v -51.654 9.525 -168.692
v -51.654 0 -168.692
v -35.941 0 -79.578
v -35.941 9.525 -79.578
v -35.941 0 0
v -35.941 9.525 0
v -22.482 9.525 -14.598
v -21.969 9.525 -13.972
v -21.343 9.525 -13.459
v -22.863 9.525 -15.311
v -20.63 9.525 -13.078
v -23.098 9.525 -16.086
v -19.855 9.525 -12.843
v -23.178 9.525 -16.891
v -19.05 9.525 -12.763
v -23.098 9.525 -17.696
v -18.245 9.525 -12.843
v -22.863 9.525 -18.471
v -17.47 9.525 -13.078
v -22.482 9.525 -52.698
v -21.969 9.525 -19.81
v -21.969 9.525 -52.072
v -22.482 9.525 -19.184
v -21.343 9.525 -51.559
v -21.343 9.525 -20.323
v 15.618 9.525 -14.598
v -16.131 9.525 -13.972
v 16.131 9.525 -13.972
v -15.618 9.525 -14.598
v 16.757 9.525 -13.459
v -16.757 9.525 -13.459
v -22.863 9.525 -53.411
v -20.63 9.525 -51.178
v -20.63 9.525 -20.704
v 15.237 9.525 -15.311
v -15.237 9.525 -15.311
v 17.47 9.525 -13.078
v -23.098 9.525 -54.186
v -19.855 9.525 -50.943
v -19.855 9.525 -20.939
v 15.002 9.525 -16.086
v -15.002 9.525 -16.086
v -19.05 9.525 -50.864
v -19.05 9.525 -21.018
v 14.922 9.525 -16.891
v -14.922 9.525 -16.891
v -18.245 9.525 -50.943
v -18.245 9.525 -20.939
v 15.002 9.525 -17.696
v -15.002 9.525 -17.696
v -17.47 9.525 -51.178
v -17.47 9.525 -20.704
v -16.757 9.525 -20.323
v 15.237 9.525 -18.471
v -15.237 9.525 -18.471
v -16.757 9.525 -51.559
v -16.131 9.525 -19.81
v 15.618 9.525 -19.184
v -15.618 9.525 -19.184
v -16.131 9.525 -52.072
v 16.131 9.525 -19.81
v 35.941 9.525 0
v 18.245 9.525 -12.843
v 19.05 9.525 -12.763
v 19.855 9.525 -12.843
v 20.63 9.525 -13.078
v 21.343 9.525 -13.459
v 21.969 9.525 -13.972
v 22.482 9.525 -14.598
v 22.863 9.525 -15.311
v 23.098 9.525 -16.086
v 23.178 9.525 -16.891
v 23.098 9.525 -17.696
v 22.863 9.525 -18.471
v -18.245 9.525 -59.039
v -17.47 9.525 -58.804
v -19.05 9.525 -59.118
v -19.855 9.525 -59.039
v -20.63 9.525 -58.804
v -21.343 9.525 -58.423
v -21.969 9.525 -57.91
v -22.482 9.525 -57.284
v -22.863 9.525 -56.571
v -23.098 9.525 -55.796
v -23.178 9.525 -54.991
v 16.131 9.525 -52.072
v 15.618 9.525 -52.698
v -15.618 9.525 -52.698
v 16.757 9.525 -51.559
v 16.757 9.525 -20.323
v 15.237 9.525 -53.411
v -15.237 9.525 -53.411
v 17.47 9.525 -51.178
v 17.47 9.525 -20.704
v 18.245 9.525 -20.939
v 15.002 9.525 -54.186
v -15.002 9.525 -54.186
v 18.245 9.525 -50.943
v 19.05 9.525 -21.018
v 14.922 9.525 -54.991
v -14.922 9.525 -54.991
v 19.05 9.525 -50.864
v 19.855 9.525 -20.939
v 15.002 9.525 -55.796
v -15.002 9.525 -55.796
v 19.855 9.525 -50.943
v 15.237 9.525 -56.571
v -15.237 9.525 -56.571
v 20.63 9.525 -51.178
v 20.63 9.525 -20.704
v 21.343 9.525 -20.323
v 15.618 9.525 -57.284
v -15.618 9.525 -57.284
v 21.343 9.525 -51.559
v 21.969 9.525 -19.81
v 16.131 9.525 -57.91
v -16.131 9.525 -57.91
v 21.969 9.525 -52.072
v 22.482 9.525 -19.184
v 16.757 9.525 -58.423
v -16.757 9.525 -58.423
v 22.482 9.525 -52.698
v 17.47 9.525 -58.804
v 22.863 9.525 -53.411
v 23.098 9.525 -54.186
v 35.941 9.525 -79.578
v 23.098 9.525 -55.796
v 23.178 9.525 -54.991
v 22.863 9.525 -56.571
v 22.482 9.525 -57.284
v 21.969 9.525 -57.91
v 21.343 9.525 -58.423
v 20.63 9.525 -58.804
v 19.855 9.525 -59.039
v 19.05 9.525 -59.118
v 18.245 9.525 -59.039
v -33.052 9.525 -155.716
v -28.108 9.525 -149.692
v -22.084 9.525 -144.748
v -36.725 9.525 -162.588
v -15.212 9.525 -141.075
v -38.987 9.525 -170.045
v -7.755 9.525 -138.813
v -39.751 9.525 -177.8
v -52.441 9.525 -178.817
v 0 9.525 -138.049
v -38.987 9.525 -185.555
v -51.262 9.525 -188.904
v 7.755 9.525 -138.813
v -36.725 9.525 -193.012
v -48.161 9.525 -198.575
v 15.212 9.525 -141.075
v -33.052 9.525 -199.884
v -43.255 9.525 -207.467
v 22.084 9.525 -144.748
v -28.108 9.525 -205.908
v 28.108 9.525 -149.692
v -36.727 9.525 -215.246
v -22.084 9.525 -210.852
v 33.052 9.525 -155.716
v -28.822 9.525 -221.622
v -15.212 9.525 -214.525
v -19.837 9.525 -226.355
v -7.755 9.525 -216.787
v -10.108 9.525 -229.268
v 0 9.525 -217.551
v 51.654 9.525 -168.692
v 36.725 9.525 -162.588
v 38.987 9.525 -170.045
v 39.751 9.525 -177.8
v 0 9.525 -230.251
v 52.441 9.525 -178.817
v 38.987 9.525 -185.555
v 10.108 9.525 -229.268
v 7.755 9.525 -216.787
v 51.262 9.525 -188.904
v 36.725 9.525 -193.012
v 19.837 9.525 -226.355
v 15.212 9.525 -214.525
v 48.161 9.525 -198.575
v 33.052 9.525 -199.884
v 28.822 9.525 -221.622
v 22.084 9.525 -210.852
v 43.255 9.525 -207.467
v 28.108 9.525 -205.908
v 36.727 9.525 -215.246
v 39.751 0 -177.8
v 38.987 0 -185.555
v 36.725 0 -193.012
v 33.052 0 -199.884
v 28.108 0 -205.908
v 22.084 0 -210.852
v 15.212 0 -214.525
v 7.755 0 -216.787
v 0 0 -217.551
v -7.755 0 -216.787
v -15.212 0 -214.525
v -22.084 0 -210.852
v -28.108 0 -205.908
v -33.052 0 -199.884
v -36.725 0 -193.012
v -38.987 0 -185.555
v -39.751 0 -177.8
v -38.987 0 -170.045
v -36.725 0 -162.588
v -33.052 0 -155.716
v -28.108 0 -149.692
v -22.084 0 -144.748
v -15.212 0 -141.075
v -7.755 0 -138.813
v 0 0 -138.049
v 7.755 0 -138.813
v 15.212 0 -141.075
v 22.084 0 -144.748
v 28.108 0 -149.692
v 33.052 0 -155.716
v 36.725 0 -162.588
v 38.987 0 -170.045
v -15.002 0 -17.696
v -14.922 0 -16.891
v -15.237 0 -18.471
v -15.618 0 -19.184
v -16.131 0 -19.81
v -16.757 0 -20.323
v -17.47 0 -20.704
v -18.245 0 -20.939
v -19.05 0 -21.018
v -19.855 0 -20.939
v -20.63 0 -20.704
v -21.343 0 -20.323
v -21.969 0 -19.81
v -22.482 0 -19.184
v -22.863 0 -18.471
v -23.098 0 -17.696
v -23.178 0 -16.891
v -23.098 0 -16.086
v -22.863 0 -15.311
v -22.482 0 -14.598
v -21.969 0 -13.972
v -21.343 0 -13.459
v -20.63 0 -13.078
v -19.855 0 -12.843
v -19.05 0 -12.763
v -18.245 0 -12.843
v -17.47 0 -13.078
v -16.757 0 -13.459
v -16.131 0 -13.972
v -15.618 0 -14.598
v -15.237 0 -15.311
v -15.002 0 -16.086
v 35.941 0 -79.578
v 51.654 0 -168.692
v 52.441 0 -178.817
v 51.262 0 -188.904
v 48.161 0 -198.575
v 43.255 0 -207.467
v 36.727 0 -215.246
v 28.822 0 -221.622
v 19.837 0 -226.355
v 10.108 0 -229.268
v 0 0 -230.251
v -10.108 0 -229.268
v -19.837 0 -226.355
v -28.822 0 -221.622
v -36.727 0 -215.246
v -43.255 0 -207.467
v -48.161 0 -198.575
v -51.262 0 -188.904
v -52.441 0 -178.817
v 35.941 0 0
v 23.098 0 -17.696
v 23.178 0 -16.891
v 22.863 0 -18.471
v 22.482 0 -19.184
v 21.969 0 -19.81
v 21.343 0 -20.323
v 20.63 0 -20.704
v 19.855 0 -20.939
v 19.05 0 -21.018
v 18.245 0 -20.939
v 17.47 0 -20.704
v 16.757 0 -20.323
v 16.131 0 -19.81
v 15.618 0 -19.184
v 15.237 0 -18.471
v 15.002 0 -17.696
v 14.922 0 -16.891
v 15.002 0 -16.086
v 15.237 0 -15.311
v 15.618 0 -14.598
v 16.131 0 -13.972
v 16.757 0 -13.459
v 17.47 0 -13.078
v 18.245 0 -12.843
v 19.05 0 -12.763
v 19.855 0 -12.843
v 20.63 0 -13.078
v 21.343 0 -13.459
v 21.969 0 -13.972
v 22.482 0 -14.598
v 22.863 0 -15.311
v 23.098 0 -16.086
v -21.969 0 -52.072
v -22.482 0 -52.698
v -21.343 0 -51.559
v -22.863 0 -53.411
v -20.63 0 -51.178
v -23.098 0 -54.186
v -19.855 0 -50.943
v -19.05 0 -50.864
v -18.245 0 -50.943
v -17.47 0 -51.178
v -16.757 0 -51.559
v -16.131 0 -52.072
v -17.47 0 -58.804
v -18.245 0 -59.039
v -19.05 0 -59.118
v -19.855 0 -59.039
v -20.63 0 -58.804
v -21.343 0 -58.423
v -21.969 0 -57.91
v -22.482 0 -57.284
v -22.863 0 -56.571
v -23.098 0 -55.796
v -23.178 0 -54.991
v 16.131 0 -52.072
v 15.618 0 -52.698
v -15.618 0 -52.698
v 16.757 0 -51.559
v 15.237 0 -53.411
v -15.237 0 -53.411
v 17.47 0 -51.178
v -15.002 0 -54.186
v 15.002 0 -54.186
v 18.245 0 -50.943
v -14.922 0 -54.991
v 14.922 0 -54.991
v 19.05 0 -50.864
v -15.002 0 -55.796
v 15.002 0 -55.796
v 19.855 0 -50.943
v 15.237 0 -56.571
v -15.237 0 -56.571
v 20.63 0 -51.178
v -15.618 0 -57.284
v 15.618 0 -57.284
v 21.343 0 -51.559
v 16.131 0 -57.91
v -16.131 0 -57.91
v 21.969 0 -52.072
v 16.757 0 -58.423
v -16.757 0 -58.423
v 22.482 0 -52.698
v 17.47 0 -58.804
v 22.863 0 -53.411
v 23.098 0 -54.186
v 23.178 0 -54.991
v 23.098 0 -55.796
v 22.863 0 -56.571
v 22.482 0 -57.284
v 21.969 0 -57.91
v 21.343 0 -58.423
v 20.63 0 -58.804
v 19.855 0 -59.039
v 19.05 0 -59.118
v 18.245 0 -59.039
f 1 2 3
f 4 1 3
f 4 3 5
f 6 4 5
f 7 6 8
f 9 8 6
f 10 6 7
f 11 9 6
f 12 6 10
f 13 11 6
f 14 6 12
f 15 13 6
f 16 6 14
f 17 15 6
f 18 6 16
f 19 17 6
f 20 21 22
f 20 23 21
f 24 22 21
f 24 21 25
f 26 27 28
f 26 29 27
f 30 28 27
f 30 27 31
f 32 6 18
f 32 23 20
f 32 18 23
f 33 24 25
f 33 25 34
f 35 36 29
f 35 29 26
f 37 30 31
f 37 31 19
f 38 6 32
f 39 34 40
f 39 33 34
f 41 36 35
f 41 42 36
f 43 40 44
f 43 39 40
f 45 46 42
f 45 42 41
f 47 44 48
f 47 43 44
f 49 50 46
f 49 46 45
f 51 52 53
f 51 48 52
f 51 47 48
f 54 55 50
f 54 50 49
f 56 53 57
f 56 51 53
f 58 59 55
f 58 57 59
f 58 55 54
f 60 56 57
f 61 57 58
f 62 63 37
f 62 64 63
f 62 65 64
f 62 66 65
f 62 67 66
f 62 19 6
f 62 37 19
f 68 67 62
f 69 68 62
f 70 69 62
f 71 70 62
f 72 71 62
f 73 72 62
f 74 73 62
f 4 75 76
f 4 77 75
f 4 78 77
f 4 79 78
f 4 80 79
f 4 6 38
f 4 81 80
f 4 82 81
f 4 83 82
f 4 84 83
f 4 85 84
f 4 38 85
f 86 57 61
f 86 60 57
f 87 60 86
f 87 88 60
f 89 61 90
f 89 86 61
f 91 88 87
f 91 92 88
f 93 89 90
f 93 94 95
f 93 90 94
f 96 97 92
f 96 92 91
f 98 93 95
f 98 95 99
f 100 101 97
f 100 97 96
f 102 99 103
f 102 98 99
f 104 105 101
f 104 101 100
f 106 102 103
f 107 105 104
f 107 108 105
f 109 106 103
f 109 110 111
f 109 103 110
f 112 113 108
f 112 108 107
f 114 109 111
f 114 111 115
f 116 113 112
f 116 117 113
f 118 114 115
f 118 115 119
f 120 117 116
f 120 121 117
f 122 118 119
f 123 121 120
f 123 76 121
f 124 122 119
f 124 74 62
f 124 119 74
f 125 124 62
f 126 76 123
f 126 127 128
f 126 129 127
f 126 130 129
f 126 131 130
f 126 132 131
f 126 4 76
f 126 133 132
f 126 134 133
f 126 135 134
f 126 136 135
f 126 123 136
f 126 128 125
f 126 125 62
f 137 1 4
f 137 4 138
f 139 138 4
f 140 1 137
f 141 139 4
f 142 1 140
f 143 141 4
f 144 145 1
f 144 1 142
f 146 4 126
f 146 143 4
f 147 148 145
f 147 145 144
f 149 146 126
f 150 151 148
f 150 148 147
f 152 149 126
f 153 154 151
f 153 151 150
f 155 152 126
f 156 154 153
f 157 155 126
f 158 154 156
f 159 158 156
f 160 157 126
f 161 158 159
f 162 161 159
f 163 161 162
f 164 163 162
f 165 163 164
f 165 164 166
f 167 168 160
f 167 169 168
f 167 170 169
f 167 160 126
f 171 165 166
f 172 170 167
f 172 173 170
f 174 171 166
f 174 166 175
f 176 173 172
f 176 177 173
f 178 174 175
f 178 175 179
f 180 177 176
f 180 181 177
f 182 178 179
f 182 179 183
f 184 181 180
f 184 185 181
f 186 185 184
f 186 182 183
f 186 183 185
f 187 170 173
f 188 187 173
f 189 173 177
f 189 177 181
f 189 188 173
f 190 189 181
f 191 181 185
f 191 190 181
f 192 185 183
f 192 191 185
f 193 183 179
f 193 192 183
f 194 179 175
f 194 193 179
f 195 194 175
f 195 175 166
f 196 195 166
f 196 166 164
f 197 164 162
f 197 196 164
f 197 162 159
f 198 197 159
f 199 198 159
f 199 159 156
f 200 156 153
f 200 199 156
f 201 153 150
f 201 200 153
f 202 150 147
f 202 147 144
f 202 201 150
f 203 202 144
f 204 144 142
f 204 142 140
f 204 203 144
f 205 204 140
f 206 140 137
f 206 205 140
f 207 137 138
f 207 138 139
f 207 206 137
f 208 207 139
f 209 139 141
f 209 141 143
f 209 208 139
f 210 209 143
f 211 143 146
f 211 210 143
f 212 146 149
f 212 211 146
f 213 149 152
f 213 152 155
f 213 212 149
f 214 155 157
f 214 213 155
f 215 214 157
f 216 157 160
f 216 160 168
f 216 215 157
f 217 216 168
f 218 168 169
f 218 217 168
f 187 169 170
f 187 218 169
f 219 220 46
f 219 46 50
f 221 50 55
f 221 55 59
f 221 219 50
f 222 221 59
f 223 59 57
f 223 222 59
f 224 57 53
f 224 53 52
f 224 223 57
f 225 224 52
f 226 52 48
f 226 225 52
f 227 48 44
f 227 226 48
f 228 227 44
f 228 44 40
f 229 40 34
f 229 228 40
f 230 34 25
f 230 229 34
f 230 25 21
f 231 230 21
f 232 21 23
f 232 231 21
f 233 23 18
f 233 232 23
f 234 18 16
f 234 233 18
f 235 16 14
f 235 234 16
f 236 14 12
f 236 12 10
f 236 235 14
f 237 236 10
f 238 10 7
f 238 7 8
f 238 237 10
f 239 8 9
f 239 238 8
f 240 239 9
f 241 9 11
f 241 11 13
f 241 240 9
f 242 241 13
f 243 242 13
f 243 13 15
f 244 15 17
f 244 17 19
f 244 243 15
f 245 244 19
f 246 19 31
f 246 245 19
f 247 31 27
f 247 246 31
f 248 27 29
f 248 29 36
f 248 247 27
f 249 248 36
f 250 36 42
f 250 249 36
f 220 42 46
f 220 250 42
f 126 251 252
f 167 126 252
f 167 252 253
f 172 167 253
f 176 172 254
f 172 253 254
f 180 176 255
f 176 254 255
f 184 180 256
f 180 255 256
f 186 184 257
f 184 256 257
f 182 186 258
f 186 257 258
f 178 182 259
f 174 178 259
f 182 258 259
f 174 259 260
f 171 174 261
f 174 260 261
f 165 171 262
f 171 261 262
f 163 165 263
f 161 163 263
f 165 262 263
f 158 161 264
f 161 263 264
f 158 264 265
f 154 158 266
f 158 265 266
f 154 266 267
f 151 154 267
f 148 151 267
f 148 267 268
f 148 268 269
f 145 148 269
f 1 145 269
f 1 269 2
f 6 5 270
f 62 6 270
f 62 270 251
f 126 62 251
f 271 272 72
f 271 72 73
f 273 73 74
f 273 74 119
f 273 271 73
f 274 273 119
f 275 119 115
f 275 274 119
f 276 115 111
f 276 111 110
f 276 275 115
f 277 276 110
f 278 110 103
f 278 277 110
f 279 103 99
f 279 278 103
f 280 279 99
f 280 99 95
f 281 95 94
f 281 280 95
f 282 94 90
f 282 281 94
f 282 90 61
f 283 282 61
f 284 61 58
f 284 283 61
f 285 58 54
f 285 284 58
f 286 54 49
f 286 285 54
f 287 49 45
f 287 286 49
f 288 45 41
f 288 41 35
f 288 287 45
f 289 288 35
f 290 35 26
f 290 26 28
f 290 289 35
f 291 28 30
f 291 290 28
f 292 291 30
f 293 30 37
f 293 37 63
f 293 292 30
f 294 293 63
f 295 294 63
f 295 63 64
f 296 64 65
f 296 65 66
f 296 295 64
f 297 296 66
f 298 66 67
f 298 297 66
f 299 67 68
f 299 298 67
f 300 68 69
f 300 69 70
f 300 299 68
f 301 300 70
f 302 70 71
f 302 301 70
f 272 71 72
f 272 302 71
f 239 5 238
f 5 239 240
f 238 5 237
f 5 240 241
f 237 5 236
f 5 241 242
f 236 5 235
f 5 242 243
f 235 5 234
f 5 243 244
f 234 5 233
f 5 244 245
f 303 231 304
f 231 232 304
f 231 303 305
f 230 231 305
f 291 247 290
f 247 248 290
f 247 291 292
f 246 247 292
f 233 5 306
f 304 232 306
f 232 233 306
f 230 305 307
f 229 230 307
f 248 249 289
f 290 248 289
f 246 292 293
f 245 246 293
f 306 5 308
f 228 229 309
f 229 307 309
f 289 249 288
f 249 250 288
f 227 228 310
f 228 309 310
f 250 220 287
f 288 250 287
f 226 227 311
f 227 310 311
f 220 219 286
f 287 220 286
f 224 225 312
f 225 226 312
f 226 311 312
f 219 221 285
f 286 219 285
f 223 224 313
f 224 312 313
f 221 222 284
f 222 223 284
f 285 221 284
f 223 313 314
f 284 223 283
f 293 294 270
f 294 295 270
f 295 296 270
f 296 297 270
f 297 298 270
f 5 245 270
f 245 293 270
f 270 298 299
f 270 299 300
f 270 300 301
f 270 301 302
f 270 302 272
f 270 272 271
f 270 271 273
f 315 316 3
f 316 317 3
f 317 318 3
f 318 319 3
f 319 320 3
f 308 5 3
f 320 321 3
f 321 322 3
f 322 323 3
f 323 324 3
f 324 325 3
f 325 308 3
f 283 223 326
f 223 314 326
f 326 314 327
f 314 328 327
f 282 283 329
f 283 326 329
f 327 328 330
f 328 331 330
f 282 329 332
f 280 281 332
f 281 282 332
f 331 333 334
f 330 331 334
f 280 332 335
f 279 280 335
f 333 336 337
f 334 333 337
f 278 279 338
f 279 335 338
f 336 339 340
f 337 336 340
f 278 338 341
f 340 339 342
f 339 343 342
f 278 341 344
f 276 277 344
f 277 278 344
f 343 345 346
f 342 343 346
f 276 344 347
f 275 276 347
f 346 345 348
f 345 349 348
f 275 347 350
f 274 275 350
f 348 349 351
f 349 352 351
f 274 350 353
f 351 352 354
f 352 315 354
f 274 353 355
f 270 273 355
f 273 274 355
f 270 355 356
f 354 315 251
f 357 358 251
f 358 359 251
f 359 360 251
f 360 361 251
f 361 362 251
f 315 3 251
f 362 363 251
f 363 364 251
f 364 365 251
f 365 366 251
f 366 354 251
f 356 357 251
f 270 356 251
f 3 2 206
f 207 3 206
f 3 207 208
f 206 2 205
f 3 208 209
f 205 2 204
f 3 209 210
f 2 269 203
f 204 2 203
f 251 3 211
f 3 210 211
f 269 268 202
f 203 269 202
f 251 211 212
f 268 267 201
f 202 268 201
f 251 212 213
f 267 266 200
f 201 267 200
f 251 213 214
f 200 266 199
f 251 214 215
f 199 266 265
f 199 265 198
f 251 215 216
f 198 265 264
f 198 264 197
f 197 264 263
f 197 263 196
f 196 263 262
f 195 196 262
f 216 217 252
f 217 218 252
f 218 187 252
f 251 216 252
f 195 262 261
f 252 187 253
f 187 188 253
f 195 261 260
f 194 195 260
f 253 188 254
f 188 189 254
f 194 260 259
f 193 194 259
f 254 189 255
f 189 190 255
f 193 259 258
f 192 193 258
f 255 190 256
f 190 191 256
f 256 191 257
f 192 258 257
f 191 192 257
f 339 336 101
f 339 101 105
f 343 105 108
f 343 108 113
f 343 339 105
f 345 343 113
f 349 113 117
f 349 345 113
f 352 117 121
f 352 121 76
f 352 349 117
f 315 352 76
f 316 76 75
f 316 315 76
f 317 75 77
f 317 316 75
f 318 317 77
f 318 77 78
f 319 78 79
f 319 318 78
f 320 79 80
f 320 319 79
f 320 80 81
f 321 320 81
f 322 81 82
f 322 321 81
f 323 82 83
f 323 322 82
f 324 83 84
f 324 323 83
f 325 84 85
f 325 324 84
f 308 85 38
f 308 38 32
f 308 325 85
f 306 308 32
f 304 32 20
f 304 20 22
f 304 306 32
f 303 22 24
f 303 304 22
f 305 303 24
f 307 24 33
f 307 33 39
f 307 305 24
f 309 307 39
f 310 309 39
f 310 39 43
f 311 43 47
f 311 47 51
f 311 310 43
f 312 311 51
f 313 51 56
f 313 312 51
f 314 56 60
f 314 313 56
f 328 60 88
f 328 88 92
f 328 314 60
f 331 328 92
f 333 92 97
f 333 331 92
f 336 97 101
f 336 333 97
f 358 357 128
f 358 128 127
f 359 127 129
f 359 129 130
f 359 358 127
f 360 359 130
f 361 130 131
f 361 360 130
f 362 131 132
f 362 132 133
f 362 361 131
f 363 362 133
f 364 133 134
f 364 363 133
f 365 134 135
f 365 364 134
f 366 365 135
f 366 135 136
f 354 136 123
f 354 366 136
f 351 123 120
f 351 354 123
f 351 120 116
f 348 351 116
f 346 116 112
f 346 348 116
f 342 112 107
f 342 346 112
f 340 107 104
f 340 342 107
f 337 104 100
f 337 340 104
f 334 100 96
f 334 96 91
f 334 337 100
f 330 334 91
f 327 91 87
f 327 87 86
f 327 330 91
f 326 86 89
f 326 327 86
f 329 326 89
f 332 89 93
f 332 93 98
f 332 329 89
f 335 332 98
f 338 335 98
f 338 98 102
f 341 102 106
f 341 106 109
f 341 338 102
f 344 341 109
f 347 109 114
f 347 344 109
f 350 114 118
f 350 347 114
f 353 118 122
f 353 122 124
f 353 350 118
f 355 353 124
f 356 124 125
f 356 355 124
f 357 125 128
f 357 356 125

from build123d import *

# Parameters (mm, degrees)
SKETCH1_R           = 39.751
SKETCH1_R_2         = 4.1275
BOSS_EXTRUDE1_DEPTH = 9.525


with BuildPart() as part:
    # Sketch1 → Boss-Extrude1 (new body)
    with BuildSketch(Plane(origin=(0, 0, 0), x_dir=(1, 0, 0), z_dir=(0, 1, 0))):
        with BuildLine():
            Line((-35.941, 0), (35.941, 0))
            Line((35.941, 0), (35.941, 79.578269268))
            Line((35.941, 79.578269268), (51.654151453, 168.691979433))
            ThreePointArc((51.654151453, 168.691979433), (0, 230.251), (-51.654151453, 168.691979433))
            Line((-51.654151453, 168.691979433), (-35.941, 79.578269268))
            Line((-35.941, 79.578269268), (-35.941, 0))
        make_face()
        with Locations((0, 177.8)):
            Circle(SKETCH1_R, mode=Mode.SUBTRACT)
        with Locations((-19.05, 54.991)):
            Circle(SKETCH1_R_2, mode=Mode.SUBTRACT)
        with Locations((19.05, 54.991)):
            Circle(SKETCH1_R_2, mode=Mode.SUBTRACT)
        with Locations((19.05, 16.891)):
            Circle(SKETCH1_R_2, mode=Mode.SUBTRACT)
        with Locations((-19.05, 16.891)):
            Circle(SKETCH1_R_2, mode=Mode.SUBTRACT)
    extrude(amount=BOSS_EXTRUDE1_DEPTH)


solid = part.part
